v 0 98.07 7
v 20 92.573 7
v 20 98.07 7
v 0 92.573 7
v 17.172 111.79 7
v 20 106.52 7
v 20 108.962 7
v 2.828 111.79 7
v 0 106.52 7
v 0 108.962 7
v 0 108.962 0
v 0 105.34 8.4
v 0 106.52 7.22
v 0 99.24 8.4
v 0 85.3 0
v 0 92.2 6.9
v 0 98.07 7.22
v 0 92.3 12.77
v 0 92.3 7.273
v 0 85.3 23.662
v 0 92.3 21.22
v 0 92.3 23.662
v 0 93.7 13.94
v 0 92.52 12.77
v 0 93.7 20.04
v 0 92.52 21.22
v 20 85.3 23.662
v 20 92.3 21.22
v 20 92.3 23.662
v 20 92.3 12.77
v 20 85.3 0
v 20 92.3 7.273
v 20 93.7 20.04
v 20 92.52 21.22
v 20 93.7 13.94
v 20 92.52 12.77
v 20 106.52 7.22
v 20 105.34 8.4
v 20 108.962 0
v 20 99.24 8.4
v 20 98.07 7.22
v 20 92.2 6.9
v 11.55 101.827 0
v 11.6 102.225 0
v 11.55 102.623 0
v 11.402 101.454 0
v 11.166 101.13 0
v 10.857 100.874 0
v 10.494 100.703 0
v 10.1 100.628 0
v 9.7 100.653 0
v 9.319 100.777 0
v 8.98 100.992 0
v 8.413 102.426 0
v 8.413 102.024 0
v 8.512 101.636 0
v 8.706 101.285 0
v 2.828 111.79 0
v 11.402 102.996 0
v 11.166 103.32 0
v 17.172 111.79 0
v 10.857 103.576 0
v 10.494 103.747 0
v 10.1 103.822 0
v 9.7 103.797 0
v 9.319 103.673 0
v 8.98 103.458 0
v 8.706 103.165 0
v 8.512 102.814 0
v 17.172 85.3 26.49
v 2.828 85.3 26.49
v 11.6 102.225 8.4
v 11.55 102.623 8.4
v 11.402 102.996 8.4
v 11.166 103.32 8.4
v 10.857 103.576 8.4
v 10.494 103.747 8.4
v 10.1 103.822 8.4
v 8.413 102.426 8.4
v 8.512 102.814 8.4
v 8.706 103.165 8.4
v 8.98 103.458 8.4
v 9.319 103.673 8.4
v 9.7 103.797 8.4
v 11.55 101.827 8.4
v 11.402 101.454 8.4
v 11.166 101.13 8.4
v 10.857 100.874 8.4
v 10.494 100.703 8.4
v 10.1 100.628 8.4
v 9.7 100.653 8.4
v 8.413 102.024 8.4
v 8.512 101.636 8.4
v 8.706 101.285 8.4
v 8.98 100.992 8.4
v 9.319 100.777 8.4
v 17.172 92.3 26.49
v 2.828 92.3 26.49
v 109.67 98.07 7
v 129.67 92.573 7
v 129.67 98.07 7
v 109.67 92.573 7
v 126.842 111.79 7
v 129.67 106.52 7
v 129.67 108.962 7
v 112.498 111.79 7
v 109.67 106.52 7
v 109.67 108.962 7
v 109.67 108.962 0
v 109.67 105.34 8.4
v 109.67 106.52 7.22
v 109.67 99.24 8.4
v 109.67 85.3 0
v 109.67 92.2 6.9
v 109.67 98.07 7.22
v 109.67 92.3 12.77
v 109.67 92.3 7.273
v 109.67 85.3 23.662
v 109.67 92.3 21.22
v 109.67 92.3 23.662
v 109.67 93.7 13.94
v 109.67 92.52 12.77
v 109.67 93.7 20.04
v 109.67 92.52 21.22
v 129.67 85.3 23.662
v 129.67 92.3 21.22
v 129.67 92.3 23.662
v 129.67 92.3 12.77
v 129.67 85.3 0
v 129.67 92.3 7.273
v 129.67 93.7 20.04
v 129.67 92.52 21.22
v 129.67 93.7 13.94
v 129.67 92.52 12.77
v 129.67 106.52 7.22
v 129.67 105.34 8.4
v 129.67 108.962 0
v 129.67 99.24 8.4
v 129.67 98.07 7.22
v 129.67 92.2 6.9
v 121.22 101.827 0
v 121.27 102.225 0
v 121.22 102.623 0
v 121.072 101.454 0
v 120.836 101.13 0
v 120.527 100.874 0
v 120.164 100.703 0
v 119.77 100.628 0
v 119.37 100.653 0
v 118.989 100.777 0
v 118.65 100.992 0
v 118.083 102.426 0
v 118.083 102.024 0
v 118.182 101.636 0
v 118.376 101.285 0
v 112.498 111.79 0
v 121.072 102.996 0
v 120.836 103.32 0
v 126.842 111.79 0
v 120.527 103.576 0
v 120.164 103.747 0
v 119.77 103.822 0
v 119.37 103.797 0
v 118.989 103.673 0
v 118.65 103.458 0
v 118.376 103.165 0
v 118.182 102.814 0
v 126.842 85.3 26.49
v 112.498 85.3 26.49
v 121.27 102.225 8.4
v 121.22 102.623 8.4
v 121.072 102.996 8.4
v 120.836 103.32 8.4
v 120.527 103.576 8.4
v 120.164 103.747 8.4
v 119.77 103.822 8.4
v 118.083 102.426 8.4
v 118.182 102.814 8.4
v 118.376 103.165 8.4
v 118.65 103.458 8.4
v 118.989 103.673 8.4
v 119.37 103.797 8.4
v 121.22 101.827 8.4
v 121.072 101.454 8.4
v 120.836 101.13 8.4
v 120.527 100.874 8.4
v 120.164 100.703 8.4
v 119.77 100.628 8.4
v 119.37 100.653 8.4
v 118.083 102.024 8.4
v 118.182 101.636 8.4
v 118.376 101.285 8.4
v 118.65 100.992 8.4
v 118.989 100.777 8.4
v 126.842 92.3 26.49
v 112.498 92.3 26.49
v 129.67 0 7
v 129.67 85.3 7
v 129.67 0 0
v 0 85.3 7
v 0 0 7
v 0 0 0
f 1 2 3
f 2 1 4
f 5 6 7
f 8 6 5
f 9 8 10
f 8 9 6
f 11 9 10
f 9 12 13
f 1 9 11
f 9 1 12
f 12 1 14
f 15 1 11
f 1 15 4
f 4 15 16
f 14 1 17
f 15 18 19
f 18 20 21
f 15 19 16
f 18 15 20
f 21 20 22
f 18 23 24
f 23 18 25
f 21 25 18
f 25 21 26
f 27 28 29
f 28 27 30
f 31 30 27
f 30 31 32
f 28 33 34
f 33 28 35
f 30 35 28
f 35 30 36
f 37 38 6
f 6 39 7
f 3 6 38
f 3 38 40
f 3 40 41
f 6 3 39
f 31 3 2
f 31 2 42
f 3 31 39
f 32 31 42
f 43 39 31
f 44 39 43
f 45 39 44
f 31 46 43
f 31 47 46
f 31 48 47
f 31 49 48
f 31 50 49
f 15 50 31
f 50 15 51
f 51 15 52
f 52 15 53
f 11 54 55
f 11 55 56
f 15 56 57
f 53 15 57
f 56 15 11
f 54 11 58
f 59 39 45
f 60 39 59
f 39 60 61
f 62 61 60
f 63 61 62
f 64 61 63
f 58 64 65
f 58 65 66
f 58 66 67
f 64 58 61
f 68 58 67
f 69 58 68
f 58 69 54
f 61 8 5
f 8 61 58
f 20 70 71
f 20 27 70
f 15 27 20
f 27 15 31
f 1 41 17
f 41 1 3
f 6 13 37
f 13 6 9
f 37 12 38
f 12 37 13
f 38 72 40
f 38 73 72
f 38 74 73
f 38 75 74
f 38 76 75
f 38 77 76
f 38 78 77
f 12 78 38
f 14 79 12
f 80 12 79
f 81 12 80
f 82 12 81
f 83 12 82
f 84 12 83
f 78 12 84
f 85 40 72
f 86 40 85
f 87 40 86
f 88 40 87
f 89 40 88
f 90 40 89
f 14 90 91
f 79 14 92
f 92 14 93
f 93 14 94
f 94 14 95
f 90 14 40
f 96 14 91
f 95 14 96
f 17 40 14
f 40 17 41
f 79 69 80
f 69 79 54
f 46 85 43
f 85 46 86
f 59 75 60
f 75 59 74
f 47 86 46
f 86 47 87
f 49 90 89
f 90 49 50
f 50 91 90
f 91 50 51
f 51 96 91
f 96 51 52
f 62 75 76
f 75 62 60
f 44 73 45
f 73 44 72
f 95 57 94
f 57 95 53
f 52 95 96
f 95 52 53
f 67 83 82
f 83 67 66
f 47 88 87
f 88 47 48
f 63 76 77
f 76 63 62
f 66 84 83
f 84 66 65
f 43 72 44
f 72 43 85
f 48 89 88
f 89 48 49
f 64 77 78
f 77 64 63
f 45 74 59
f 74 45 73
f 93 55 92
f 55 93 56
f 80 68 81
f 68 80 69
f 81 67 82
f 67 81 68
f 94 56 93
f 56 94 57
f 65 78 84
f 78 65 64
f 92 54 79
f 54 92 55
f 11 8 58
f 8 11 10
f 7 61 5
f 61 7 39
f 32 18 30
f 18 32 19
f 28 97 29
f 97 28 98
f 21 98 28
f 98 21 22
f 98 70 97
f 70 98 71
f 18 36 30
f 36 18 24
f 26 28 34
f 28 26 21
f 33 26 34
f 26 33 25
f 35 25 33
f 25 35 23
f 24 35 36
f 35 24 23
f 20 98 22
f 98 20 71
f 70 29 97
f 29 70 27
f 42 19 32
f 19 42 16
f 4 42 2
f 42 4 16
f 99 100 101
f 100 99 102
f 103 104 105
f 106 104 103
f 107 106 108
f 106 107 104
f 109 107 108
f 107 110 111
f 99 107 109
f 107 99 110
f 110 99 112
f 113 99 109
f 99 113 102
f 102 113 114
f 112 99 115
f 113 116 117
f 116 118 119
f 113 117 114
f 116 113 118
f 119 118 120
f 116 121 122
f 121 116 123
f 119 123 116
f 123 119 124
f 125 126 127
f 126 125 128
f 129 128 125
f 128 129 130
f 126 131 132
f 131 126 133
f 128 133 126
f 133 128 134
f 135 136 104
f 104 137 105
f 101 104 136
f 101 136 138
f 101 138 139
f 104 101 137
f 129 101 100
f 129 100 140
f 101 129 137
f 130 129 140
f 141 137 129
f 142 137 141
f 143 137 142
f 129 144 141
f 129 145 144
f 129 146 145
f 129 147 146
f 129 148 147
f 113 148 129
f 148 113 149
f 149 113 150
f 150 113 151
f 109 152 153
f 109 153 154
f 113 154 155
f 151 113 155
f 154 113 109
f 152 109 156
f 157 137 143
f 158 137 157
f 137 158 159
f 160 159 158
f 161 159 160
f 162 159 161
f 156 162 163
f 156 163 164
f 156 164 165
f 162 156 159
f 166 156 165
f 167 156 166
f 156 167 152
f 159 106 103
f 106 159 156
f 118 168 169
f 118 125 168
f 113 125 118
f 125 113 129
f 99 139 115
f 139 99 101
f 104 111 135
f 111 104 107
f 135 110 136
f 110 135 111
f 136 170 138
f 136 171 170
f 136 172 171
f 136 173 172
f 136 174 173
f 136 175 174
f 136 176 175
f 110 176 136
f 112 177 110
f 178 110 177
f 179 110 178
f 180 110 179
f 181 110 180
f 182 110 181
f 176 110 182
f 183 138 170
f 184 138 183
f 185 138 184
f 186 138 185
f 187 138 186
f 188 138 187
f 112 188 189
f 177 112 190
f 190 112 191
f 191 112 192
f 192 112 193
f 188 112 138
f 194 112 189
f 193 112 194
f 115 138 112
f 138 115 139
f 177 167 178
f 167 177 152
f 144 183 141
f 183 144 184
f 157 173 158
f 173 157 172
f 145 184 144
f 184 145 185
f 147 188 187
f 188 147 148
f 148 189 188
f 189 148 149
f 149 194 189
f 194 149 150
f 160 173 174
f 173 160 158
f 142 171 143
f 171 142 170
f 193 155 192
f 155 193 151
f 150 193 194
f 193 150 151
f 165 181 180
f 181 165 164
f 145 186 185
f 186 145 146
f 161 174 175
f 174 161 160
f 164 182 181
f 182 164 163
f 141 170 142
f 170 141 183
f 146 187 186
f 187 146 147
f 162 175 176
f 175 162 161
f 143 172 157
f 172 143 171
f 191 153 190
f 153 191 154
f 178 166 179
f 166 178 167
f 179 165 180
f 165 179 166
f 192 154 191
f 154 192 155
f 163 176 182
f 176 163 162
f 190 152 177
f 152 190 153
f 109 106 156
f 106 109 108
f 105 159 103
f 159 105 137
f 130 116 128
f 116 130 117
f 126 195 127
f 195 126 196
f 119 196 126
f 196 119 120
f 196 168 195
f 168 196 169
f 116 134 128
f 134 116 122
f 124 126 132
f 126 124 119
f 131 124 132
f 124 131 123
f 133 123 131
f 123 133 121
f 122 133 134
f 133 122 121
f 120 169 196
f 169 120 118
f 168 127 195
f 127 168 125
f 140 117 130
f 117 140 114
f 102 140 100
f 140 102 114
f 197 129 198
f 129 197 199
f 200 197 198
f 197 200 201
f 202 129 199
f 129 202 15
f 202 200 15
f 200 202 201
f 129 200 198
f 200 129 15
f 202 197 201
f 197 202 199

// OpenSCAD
// render quality settings
$fn = 25;

module single_extrusion_rail_mount(bolt_hole) {
    difference() {
        union() {
            cube([7,26.49,20]);

            // extrusion inset locator
            translate([7,12.77,0]){
                linear_extrude(height=20){
                    polygon([[0,0],[0.22,0],[1.4,1.17],[1.4,7.27],[0.22,8.45],[0,8.45]]);
                }
            }
        }

        // bolt hole
        if (bolt_hole == 1) {
            translate([-1,16.925,10]) {
                rotate([0,90,0]) {
                    cylinder(h=10, d=3.2);
                }
            }
        }

        // cut corners
        translate([4,26.49,20]) {
            rotate([45,0,0]) {
                cube([10,4,4], center=true);
            }
        }
        translate([4,26.49,0]) {
            rotate([45,0,0]) {
                cube([10,4,4], center=true);
            }
        }
    }
}

module extrusion_rail_mount() {
    difference() {
        union() {
            single_extrusion_rail_mount(bolt_hole=1);
            mirror([0,1,0])rotate(270)single_extrusion_rail_mount(bolt_hole=0);
        }
        // corner notch
        translate([6.9,6.9,-1]) {
            rotate(45) {
                linear_extrude(height=22){
                    polygon([[0,0],[(0.63/2)/tan(30),0.63/2],[(0.63/2)/tan(30),-0.63/2]]);
                }
            }
        }
    }

    // bolt hole
}

cube([109.67+20,84.3+1,7]);

// upper mount
translate([20,84.3+1,0]) {
    rotate([0,270,0]) {
        extrusion_rail_mount();
    }
}

// lower mount
translate([109.67+20,84.3+1,0]) {
    rotate([0,270,0]) {
        extrusion_rail_mount();
    }
}
